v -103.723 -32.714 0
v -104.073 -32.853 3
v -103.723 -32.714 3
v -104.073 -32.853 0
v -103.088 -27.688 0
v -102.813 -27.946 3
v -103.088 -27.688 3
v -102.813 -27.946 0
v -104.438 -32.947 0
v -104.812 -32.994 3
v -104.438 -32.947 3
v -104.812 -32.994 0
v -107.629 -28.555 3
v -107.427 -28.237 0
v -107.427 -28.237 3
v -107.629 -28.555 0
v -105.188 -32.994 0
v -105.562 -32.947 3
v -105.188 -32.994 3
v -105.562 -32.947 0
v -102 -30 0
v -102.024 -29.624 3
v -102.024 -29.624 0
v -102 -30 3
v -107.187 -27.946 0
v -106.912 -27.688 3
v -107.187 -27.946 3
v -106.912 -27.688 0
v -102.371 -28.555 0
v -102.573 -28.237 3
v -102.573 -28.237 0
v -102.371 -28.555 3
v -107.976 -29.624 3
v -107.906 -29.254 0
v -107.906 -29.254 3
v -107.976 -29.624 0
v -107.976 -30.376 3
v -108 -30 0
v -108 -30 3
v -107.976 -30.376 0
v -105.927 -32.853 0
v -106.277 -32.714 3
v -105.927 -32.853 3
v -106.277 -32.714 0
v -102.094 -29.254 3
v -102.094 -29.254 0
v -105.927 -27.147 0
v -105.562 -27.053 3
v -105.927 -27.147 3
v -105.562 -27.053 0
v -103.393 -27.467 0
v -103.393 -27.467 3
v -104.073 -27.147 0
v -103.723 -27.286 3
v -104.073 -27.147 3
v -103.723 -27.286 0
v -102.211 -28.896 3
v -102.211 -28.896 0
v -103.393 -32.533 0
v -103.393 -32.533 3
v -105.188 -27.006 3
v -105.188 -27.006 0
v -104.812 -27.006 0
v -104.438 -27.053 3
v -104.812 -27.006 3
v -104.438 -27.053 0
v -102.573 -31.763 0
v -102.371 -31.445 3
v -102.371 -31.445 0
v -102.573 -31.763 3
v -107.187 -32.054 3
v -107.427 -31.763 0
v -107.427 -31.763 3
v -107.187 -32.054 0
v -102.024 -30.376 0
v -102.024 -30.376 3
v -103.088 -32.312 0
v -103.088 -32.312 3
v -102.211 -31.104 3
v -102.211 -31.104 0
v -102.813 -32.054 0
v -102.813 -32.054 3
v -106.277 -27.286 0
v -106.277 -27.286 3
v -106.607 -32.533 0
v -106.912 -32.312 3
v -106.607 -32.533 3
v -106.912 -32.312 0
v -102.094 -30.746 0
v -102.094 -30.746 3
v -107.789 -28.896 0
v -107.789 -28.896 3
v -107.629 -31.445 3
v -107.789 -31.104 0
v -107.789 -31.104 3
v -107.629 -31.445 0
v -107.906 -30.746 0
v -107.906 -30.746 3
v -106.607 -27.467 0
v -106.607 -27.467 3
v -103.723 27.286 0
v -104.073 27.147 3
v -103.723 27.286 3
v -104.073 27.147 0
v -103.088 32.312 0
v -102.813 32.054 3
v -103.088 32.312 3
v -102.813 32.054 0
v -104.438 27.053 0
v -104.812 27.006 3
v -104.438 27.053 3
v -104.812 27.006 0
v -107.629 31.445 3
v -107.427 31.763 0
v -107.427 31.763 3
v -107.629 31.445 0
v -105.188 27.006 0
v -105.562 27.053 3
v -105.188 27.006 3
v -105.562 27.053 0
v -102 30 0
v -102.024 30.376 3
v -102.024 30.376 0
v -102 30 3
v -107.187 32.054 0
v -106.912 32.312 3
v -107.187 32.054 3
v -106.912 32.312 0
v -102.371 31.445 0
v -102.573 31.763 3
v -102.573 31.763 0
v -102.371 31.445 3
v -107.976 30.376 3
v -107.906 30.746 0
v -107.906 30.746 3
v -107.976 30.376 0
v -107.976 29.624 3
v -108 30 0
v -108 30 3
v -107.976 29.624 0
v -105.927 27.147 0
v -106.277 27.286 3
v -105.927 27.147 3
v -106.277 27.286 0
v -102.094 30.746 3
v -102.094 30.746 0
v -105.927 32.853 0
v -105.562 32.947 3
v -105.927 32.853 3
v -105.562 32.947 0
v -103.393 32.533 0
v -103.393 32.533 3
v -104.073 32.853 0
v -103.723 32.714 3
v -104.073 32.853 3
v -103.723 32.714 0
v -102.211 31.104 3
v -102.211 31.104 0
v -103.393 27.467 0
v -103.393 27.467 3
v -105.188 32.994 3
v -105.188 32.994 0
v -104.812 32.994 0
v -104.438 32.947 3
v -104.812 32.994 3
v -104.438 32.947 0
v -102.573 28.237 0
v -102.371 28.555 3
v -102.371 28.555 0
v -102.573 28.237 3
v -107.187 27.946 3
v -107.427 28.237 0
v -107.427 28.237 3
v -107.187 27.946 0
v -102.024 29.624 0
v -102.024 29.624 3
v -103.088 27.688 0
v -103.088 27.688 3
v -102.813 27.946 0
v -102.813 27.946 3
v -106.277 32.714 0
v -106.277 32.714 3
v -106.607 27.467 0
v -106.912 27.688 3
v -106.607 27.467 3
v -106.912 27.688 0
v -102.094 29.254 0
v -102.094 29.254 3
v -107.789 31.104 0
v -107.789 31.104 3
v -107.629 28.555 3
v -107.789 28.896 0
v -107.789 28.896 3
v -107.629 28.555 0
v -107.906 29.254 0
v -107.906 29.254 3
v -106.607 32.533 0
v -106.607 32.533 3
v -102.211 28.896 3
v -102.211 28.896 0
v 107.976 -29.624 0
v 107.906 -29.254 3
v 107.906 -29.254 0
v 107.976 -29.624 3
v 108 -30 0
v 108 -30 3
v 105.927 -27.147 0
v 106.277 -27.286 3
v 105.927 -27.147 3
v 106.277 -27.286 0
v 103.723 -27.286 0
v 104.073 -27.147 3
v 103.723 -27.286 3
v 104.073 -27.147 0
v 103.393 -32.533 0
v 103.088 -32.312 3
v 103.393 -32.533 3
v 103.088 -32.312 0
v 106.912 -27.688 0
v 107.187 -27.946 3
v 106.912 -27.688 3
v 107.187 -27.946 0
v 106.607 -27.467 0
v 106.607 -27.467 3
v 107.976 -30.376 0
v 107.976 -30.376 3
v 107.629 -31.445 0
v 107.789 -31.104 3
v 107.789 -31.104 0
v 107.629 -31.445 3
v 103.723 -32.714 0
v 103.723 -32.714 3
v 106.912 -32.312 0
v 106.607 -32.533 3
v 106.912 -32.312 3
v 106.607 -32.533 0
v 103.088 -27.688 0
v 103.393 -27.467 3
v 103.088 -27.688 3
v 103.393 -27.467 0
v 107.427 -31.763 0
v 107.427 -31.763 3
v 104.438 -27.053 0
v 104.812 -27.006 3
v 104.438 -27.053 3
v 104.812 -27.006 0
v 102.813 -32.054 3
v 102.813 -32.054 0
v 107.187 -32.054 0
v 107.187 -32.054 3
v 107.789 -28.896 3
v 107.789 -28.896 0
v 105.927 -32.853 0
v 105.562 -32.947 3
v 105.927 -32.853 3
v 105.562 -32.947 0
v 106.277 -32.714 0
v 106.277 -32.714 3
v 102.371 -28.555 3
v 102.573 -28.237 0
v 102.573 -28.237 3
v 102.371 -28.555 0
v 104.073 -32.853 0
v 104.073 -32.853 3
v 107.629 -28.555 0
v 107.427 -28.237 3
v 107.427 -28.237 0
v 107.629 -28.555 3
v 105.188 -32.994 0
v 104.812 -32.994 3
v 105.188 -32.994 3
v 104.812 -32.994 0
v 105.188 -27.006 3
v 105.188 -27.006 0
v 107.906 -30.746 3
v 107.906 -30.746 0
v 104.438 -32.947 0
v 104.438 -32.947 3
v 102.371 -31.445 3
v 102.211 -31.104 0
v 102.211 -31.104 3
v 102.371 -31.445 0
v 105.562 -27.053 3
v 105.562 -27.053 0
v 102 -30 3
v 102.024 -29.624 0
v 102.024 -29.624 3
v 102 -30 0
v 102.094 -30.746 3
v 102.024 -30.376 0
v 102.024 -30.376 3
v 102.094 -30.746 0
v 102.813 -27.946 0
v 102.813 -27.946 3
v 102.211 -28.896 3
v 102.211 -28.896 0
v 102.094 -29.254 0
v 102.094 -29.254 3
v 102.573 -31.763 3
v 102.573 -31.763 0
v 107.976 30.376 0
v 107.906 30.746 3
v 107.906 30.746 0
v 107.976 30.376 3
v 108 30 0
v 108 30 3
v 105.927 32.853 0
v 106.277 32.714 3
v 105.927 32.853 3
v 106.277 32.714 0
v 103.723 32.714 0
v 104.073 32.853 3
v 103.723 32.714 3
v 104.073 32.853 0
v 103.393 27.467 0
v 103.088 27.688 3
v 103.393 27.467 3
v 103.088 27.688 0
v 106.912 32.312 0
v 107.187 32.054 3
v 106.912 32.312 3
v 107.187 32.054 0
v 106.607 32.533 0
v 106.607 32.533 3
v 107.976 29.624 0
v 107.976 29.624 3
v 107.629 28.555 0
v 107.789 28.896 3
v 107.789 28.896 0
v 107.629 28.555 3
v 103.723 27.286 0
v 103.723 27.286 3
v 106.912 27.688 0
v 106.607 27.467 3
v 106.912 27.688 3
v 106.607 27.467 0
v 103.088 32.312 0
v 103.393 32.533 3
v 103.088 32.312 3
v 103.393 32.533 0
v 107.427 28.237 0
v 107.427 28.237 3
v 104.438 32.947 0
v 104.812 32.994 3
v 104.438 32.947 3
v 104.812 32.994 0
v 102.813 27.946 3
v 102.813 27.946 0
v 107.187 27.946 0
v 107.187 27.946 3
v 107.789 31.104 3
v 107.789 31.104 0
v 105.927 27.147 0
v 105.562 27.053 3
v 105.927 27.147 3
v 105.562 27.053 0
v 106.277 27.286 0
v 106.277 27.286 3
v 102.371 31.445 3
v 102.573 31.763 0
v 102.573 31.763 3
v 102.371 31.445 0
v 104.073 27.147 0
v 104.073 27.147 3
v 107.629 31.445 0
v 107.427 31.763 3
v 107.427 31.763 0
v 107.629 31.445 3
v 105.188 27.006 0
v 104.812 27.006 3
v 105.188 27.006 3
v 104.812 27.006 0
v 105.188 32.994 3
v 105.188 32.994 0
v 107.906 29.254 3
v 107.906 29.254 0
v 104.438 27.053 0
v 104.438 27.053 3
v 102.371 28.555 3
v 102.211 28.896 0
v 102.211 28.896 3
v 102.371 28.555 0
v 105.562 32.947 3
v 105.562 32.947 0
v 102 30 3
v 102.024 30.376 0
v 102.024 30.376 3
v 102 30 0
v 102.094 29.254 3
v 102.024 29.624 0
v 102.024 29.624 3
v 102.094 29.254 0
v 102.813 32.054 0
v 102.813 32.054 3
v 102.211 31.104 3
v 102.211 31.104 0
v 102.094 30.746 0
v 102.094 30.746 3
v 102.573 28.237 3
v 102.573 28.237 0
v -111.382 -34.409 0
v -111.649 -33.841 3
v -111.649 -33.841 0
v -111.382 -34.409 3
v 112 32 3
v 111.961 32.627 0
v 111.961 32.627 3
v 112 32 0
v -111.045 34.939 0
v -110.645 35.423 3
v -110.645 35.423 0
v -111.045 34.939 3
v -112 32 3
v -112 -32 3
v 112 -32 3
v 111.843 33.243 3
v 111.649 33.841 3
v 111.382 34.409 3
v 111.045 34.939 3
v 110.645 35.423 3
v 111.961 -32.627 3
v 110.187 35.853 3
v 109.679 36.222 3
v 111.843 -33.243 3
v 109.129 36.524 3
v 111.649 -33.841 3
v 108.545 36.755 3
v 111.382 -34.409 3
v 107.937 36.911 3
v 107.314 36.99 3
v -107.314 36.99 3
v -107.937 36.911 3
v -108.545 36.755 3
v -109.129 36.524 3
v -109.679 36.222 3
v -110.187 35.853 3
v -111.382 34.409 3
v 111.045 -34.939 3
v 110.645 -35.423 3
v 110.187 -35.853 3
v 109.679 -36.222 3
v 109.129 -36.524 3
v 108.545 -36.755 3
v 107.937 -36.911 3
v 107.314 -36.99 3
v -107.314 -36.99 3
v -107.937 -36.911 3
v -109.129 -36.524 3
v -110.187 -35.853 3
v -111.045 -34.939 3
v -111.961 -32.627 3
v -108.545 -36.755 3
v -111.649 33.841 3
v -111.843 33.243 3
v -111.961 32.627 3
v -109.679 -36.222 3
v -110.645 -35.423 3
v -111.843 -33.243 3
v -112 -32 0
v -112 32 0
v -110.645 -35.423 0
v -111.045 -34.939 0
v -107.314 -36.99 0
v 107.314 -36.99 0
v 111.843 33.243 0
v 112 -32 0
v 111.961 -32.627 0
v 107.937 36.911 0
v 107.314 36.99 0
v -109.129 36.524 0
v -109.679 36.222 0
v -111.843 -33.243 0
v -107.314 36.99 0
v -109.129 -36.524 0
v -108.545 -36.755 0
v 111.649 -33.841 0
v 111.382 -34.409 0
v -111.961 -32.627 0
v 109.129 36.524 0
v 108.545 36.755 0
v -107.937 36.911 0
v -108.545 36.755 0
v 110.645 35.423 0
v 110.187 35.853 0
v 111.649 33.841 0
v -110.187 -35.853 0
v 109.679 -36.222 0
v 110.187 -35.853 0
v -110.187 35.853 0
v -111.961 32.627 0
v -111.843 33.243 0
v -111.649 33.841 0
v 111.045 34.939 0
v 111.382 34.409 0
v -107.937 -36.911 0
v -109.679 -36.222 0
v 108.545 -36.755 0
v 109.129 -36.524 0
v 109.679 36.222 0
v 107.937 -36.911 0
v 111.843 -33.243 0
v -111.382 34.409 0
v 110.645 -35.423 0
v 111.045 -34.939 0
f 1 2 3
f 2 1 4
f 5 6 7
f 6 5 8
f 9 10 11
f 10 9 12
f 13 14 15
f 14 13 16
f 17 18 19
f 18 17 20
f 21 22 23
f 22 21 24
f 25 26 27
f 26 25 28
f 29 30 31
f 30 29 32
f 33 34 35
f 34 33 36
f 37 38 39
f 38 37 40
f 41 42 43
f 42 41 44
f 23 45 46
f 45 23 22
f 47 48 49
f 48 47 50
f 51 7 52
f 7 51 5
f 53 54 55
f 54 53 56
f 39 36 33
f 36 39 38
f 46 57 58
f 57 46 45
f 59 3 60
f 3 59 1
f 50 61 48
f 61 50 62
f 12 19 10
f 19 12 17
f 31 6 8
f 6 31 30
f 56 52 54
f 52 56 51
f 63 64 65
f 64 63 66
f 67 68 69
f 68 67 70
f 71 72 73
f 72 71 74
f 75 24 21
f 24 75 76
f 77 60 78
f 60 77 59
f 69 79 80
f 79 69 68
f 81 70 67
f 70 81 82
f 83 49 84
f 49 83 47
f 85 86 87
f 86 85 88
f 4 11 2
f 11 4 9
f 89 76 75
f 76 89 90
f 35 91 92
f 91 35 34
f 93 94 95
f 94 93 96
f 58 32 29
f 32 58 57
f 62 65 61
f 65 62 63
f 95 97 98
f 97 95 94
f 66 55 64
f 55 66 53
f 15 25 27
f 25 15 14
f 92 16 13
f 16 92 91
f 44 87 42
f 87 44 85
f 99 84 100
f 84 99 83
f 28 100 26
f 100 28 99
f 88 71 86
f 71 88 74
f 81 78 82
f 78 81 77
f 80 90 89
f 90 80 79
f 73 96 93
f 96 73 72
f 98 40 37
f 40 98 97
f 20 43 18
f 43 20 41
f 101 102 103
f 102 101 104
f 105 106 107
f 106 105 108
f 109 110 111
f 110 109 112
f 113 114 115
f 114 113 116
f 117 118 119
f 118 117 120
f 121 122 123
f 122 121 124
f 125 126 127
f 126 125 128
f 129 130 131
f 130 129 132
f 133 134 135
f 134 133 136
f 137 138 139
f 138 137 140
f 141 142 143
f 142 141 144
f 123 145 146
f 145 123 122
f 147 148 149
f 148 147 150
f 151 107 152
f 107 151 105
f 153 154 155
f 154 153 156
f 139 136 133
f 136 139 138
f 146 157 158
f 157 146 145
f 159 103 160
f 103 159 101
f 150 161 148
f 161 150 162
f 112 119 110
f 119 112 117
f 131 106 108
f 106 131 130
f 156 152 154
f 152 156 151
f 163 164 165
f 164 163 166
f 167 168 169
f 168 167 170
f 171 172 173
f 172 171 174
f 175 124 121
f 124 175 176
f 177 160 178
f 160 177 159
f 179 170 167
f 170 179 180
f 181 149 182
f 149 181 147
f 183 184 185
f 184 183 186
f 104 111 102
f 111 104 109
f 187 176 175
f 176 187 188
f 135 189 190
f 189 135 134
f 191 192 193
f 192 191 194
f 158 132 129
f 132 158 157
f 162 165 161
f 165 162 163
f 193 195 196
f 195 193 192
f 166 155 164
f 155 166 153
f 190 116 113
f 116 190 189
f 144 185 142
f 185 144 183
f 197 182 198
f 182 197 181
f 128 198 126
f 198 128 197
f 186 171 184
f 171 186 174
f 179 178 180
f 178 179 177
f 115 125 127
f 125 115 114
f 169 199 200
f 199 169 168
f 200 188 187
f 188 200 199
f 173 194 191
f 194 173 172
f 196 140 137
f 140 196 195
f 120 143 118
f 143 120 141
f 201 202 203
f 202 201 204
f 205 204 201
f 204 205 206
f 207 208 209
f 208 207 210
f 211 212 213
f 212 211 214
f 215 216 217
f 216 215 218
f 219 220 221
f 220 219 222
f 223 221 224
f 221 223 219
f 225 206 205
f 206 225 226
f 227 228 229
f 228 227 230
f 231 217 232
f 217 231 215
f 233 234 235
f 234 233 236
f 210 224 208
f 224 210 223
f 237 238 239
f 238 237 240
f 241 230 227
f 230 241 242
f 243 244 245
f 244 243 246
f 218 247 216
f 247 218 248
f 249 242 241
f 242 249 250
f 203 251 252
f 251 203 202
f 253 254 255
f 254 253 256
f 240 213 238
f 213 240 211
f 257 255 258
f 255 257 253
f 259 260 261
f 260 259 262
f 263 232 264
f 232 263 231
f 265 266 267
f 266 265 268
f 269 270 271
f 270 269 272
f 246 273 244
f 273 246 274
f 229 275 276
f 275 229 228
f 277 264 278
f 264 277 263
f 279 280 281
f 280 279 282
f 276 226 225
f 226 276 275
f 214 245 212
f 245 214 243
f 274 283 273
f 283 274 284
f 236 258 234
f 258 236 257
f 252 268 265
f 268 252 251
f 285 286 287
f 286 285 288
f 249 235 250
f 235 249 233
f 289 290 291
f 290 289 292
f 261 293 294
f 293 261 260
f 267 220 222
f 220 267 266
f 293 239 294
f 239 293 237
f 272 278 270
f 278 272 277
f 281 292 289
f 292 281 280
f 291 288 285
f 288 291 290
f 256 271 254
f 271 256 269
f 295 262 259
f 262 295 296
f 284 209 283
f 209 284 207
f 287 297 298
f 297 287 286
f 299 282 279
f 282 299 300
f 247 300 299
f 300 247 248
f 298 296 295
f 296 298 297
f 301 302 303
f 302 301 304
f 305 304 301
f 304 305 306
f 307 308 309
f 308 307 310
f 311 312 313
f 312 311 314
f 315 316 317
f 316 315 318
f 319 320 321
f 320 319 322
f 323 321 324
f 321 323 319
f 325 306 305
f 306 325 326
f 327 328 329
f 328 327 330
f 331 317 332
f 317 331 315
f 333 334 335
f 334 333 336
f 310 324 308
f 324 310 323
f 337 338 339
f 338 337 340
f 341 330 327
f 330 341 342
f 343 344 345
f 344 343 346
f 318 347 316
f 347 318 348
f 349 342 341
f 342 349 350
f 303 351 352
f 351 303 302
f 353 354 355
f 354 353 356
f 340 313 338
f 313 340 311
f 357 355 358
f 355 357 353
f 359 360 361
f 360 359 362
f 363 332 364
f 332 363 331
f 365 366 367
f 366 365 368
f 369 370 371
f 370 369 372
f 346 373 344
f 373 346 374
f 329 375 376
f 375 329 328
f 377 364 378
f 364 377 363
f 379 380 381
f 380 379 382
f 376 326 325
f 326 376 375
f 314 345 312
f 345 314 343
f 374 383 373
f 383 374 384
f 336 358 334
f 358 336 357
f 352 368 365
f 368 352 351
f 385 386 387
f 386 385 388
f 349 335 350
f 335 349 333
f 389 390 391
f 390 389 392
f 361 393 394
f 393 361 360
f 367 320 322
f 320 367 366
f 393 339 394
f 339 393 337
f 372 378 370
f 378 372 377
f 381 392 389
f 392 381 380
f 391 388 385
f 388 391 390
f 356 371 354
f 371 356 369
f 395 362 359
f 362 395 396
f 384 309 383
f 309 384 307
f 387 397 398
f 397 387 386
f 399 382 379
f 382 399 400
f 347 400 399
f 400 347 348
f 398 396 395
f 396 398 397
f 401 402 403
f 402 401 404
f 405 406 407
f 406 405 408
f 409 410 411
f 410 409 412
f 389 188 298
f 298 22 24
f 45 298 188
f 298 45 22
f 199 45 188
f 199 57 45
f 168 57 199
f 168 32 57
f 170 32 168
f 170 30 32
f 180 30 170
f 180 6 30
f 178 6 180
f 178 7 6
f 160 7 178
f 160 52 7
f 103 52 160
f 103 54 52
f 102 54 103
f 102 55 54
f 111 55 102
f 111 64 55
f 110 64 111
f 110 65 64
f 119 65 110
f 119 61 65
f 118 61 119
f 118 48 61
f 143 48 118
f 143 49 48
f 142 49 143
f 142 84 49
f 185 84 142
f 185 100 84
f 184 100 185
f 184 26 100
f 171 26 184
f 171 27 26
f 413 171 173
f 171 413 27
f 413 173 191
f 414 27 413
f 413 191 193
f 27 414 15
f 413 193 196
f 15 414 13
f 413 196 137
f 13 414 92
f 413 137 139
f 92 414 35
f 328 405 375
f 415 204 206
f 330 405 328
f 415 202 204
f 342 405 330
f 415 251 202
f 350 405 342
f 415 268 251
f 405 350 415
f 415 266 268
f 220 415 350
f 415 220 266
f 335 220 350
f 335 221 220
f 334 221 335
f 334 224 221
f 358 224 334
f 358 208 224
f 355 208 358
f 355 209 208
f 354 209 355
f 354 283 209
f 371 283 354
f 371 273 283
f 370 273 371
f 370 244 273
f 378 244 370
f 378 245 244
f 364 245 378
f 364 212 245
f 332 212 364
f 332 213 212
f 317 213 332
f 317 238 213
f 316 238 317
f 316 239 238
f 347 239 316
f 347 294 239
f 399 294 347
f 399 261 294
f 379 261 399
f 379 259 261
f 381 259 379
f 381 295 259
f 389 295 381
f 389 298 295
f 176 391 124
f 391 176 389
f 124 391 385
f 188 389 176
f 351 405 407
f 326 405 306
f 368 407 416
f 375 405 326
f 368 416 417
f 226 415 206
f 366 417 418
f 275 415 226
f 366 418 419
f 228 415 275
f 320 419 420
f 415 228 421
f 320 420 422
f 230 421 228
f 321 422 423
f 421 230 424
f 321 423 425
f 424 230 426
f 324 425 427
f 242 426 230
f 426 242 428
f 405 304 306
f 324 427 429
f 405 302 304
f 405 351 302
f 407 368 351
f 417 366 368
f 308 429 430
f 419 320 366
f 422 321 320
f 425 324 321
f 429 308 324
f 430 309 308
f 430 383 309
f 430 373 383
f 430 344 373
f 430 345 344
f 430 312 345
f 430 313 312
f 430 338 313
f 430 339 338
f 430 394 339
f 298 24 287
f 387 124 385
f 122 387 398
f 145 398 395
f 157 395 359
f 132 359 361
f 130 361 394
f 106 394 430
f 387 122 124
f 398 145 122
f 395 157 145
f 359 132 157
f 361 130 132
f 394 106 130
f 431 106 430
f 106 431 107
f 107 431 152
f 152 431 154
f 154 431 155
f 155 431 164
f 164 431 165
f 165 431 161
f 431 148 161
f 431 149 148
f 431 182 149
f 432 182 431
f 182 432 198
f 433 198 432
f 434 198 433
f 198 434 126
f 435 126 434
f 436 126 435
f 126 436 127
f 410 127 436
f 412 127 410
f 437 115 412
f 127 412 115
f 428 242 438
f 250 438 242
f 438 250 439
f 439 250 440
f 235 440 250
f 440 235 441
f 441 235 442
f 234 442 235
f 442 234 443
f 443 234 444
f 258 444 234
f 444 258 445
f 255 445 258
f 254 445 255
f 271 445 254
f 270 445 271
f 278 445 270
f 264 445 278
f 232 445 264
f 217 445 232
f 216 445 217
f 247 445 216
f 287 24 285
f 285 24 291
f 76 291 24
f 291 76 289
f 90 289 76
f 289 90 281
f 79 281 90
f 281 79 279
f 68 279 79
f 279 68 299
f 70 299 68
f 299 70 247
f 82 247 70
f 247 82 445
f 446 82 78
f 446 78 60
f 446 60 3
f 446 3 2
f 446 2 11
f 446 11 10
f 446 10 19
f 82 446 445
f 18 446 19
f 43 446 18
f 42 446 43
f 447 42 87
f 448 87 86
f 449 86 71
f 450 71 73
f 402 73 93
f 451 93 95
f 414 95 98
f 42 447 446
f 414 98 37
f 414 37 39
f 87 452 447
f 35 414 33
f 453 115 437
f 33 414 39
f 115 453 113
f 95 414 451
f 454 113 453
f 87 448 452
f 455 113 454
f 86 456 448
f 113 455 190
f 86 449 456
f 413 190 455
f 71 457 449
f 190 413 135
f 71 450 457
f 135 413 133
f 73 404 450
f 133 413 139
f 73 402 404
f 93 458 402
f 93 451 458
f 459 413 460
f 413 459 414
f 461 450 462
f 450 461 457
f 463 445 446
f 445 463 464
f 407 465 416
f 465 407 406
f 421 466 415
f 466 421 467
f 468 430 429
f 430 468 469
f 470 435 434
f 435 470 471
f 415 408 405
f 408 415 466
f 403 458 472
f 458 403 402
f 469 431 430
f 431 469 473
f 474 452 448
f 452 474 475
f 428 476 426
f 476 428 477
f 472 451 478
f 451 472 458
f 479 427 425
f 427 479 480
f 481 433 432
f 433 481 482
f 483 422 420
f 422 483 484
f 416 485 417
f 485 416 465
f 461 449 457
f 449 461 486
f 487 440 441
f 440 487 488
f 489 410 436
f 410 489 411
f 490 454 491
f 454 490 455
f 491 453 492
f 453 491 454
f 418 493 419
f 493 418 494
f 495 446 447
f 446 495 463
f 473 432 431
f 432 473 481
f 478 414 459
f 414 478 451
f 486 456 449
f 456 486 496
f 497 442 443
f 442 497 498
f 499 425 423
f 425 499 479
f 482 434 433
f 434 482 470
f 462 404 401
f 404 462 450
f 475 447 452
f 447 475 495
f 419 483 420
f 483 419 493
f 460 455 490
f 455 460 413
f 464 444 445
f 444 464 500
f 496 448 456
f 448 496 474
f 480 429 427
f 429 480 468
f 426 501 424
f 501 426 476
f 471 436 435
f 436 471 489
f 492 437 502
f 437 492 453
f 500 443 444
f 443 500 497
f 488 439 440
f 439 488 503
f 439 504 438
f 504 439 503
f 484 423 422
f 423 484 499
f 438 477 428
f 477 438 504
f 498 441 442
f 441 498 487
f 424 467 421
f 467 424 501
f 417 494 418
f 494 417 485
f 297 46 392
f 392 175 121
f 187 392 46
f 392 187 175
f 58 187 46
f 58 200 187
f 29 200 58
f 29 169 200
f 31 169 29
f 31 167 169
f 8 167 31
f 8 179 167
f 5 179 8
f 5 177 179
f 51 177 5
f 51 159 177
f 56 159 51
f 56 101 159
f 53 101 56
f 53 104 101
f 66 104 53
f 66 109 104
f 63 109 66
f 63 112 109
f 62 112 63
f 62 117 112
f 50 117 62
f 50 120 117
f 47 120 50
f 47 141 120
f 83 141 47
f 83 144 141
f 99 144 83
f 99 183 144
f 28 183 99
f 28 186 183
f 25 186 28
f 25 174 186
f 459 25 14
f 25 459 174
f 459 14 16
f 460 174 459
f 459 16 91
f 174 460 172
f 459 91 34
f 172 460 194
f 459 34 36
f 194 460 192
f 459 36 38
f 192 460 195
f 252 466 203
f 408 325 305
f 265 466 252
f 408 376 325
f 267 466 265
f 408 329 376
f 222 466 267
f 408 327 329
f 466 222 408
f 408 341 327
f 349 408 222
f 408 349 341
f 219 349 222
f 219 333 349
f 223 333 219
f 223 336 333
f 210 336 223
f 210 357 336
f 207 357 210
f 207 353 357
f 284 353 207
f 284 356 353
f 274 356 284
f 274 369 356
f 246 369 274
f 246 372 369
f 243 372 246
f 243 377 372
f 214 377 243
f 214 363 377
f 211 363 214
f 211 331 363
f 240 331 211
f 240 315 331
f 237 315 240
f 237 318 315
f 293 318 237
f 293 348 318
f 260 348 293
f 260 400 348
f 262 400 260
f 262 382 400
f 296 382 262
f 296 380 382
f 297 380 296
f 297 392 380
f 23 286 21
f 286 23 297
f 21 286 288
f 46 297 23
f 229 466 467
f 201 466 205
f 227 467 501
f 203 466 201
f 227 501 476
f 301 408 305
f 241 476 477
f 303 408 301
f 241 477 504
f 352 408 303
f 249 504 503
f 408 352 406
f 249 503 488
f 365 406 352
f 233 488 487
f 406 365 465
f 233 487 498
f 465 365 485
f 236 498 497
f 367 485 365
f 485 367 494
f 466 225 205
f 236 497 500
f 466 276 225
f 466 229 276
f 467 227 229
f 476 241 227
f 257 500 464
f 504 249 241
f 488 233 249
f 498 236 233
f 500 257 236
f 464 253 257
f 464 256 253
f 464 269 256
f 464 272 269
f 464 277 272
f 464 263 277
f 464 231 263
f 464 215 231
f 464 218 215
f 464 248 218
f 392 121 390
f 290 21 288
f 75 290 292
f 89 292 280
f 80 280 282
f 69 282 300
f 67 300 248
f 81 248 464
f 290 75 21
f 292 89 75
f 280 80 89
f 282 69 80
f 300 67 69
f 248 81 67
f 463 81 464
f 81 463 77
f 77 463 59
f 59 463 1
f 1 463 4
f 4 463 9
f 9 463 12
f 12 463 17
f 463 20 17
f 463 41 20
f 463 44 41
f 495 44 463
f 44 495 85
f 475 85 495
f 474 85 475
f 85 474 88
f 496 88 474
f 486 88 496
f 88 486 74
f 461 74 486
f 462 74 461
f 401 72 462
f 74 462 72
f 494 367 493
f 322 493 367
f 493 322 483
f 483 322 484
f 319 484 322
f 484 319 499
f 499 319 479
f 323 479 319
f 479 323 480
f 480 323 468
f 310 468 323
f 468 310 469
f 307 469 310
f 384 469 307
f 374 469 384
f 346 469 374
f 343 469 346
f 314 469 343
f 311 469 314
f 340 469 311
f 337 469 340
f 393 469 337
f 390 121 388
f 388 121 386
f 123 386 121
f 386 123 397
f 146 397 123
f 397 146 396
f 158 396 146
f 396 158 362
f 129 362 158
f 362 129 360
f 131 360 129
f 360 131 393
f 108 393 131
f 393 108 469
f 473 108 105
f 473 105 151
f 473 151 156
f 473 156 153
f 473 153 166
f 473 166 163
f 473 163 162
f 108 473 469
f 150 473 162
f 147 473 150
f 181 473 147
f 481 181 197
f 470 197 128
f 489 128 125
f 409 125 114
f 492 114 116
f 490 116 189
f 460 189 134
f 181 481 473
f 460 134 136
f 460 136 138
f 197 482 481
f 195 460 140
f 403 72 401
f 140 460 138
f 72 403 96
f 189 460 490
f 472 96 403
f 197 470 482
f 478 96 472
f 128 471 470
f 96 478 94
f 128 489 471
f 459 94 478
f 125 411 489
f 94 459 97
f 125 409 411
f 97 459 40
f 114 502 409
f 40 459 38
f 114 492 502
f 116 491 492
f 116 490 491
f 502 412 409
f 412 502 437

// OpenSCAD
$fn = 50;


difference() {
	union() {
		hull() {
			translate(v = [-107.0000000000, 32.0000000000, 0]) {
				cylinder(h = 3, r = 5);
			}
			translate(v = [107.0000000000, 32.0000000000, 0]) {
				cylinder(h = 3, r = 5);
			}
			translate(v = [-107.0000000000, -32.0000000000, 0]) {
				cylinder(h = 3, r = 5);
			}
			translate(v = [107.0000000000, -32.0000000000, 0]) {
				cylinder(h = 3, r = 5);
			}
		}
	}
	union() {
		translate(v = [-105.0000000000, -30.0000000000, -100.0000000000]) {
			cylinder(h = 200, r = 3.0000000000);
		}
		translate(v = [-105.0000000000, 30.0000000000, -100.0000000000]) {
			cylinder(h = 200, r = 3.0000000000);
		}
		translate(v = [105.0000000000, -30.0000000000, -100.0000000000]) {
			cylinder(h = 200, r = 3.0000000000);
		}
		translate(v = [105.0000000000, 30.0000000000, -100.0000000000]) {
			cylinder(h = 200, r = 3.0000000000);
		}
	}
}
